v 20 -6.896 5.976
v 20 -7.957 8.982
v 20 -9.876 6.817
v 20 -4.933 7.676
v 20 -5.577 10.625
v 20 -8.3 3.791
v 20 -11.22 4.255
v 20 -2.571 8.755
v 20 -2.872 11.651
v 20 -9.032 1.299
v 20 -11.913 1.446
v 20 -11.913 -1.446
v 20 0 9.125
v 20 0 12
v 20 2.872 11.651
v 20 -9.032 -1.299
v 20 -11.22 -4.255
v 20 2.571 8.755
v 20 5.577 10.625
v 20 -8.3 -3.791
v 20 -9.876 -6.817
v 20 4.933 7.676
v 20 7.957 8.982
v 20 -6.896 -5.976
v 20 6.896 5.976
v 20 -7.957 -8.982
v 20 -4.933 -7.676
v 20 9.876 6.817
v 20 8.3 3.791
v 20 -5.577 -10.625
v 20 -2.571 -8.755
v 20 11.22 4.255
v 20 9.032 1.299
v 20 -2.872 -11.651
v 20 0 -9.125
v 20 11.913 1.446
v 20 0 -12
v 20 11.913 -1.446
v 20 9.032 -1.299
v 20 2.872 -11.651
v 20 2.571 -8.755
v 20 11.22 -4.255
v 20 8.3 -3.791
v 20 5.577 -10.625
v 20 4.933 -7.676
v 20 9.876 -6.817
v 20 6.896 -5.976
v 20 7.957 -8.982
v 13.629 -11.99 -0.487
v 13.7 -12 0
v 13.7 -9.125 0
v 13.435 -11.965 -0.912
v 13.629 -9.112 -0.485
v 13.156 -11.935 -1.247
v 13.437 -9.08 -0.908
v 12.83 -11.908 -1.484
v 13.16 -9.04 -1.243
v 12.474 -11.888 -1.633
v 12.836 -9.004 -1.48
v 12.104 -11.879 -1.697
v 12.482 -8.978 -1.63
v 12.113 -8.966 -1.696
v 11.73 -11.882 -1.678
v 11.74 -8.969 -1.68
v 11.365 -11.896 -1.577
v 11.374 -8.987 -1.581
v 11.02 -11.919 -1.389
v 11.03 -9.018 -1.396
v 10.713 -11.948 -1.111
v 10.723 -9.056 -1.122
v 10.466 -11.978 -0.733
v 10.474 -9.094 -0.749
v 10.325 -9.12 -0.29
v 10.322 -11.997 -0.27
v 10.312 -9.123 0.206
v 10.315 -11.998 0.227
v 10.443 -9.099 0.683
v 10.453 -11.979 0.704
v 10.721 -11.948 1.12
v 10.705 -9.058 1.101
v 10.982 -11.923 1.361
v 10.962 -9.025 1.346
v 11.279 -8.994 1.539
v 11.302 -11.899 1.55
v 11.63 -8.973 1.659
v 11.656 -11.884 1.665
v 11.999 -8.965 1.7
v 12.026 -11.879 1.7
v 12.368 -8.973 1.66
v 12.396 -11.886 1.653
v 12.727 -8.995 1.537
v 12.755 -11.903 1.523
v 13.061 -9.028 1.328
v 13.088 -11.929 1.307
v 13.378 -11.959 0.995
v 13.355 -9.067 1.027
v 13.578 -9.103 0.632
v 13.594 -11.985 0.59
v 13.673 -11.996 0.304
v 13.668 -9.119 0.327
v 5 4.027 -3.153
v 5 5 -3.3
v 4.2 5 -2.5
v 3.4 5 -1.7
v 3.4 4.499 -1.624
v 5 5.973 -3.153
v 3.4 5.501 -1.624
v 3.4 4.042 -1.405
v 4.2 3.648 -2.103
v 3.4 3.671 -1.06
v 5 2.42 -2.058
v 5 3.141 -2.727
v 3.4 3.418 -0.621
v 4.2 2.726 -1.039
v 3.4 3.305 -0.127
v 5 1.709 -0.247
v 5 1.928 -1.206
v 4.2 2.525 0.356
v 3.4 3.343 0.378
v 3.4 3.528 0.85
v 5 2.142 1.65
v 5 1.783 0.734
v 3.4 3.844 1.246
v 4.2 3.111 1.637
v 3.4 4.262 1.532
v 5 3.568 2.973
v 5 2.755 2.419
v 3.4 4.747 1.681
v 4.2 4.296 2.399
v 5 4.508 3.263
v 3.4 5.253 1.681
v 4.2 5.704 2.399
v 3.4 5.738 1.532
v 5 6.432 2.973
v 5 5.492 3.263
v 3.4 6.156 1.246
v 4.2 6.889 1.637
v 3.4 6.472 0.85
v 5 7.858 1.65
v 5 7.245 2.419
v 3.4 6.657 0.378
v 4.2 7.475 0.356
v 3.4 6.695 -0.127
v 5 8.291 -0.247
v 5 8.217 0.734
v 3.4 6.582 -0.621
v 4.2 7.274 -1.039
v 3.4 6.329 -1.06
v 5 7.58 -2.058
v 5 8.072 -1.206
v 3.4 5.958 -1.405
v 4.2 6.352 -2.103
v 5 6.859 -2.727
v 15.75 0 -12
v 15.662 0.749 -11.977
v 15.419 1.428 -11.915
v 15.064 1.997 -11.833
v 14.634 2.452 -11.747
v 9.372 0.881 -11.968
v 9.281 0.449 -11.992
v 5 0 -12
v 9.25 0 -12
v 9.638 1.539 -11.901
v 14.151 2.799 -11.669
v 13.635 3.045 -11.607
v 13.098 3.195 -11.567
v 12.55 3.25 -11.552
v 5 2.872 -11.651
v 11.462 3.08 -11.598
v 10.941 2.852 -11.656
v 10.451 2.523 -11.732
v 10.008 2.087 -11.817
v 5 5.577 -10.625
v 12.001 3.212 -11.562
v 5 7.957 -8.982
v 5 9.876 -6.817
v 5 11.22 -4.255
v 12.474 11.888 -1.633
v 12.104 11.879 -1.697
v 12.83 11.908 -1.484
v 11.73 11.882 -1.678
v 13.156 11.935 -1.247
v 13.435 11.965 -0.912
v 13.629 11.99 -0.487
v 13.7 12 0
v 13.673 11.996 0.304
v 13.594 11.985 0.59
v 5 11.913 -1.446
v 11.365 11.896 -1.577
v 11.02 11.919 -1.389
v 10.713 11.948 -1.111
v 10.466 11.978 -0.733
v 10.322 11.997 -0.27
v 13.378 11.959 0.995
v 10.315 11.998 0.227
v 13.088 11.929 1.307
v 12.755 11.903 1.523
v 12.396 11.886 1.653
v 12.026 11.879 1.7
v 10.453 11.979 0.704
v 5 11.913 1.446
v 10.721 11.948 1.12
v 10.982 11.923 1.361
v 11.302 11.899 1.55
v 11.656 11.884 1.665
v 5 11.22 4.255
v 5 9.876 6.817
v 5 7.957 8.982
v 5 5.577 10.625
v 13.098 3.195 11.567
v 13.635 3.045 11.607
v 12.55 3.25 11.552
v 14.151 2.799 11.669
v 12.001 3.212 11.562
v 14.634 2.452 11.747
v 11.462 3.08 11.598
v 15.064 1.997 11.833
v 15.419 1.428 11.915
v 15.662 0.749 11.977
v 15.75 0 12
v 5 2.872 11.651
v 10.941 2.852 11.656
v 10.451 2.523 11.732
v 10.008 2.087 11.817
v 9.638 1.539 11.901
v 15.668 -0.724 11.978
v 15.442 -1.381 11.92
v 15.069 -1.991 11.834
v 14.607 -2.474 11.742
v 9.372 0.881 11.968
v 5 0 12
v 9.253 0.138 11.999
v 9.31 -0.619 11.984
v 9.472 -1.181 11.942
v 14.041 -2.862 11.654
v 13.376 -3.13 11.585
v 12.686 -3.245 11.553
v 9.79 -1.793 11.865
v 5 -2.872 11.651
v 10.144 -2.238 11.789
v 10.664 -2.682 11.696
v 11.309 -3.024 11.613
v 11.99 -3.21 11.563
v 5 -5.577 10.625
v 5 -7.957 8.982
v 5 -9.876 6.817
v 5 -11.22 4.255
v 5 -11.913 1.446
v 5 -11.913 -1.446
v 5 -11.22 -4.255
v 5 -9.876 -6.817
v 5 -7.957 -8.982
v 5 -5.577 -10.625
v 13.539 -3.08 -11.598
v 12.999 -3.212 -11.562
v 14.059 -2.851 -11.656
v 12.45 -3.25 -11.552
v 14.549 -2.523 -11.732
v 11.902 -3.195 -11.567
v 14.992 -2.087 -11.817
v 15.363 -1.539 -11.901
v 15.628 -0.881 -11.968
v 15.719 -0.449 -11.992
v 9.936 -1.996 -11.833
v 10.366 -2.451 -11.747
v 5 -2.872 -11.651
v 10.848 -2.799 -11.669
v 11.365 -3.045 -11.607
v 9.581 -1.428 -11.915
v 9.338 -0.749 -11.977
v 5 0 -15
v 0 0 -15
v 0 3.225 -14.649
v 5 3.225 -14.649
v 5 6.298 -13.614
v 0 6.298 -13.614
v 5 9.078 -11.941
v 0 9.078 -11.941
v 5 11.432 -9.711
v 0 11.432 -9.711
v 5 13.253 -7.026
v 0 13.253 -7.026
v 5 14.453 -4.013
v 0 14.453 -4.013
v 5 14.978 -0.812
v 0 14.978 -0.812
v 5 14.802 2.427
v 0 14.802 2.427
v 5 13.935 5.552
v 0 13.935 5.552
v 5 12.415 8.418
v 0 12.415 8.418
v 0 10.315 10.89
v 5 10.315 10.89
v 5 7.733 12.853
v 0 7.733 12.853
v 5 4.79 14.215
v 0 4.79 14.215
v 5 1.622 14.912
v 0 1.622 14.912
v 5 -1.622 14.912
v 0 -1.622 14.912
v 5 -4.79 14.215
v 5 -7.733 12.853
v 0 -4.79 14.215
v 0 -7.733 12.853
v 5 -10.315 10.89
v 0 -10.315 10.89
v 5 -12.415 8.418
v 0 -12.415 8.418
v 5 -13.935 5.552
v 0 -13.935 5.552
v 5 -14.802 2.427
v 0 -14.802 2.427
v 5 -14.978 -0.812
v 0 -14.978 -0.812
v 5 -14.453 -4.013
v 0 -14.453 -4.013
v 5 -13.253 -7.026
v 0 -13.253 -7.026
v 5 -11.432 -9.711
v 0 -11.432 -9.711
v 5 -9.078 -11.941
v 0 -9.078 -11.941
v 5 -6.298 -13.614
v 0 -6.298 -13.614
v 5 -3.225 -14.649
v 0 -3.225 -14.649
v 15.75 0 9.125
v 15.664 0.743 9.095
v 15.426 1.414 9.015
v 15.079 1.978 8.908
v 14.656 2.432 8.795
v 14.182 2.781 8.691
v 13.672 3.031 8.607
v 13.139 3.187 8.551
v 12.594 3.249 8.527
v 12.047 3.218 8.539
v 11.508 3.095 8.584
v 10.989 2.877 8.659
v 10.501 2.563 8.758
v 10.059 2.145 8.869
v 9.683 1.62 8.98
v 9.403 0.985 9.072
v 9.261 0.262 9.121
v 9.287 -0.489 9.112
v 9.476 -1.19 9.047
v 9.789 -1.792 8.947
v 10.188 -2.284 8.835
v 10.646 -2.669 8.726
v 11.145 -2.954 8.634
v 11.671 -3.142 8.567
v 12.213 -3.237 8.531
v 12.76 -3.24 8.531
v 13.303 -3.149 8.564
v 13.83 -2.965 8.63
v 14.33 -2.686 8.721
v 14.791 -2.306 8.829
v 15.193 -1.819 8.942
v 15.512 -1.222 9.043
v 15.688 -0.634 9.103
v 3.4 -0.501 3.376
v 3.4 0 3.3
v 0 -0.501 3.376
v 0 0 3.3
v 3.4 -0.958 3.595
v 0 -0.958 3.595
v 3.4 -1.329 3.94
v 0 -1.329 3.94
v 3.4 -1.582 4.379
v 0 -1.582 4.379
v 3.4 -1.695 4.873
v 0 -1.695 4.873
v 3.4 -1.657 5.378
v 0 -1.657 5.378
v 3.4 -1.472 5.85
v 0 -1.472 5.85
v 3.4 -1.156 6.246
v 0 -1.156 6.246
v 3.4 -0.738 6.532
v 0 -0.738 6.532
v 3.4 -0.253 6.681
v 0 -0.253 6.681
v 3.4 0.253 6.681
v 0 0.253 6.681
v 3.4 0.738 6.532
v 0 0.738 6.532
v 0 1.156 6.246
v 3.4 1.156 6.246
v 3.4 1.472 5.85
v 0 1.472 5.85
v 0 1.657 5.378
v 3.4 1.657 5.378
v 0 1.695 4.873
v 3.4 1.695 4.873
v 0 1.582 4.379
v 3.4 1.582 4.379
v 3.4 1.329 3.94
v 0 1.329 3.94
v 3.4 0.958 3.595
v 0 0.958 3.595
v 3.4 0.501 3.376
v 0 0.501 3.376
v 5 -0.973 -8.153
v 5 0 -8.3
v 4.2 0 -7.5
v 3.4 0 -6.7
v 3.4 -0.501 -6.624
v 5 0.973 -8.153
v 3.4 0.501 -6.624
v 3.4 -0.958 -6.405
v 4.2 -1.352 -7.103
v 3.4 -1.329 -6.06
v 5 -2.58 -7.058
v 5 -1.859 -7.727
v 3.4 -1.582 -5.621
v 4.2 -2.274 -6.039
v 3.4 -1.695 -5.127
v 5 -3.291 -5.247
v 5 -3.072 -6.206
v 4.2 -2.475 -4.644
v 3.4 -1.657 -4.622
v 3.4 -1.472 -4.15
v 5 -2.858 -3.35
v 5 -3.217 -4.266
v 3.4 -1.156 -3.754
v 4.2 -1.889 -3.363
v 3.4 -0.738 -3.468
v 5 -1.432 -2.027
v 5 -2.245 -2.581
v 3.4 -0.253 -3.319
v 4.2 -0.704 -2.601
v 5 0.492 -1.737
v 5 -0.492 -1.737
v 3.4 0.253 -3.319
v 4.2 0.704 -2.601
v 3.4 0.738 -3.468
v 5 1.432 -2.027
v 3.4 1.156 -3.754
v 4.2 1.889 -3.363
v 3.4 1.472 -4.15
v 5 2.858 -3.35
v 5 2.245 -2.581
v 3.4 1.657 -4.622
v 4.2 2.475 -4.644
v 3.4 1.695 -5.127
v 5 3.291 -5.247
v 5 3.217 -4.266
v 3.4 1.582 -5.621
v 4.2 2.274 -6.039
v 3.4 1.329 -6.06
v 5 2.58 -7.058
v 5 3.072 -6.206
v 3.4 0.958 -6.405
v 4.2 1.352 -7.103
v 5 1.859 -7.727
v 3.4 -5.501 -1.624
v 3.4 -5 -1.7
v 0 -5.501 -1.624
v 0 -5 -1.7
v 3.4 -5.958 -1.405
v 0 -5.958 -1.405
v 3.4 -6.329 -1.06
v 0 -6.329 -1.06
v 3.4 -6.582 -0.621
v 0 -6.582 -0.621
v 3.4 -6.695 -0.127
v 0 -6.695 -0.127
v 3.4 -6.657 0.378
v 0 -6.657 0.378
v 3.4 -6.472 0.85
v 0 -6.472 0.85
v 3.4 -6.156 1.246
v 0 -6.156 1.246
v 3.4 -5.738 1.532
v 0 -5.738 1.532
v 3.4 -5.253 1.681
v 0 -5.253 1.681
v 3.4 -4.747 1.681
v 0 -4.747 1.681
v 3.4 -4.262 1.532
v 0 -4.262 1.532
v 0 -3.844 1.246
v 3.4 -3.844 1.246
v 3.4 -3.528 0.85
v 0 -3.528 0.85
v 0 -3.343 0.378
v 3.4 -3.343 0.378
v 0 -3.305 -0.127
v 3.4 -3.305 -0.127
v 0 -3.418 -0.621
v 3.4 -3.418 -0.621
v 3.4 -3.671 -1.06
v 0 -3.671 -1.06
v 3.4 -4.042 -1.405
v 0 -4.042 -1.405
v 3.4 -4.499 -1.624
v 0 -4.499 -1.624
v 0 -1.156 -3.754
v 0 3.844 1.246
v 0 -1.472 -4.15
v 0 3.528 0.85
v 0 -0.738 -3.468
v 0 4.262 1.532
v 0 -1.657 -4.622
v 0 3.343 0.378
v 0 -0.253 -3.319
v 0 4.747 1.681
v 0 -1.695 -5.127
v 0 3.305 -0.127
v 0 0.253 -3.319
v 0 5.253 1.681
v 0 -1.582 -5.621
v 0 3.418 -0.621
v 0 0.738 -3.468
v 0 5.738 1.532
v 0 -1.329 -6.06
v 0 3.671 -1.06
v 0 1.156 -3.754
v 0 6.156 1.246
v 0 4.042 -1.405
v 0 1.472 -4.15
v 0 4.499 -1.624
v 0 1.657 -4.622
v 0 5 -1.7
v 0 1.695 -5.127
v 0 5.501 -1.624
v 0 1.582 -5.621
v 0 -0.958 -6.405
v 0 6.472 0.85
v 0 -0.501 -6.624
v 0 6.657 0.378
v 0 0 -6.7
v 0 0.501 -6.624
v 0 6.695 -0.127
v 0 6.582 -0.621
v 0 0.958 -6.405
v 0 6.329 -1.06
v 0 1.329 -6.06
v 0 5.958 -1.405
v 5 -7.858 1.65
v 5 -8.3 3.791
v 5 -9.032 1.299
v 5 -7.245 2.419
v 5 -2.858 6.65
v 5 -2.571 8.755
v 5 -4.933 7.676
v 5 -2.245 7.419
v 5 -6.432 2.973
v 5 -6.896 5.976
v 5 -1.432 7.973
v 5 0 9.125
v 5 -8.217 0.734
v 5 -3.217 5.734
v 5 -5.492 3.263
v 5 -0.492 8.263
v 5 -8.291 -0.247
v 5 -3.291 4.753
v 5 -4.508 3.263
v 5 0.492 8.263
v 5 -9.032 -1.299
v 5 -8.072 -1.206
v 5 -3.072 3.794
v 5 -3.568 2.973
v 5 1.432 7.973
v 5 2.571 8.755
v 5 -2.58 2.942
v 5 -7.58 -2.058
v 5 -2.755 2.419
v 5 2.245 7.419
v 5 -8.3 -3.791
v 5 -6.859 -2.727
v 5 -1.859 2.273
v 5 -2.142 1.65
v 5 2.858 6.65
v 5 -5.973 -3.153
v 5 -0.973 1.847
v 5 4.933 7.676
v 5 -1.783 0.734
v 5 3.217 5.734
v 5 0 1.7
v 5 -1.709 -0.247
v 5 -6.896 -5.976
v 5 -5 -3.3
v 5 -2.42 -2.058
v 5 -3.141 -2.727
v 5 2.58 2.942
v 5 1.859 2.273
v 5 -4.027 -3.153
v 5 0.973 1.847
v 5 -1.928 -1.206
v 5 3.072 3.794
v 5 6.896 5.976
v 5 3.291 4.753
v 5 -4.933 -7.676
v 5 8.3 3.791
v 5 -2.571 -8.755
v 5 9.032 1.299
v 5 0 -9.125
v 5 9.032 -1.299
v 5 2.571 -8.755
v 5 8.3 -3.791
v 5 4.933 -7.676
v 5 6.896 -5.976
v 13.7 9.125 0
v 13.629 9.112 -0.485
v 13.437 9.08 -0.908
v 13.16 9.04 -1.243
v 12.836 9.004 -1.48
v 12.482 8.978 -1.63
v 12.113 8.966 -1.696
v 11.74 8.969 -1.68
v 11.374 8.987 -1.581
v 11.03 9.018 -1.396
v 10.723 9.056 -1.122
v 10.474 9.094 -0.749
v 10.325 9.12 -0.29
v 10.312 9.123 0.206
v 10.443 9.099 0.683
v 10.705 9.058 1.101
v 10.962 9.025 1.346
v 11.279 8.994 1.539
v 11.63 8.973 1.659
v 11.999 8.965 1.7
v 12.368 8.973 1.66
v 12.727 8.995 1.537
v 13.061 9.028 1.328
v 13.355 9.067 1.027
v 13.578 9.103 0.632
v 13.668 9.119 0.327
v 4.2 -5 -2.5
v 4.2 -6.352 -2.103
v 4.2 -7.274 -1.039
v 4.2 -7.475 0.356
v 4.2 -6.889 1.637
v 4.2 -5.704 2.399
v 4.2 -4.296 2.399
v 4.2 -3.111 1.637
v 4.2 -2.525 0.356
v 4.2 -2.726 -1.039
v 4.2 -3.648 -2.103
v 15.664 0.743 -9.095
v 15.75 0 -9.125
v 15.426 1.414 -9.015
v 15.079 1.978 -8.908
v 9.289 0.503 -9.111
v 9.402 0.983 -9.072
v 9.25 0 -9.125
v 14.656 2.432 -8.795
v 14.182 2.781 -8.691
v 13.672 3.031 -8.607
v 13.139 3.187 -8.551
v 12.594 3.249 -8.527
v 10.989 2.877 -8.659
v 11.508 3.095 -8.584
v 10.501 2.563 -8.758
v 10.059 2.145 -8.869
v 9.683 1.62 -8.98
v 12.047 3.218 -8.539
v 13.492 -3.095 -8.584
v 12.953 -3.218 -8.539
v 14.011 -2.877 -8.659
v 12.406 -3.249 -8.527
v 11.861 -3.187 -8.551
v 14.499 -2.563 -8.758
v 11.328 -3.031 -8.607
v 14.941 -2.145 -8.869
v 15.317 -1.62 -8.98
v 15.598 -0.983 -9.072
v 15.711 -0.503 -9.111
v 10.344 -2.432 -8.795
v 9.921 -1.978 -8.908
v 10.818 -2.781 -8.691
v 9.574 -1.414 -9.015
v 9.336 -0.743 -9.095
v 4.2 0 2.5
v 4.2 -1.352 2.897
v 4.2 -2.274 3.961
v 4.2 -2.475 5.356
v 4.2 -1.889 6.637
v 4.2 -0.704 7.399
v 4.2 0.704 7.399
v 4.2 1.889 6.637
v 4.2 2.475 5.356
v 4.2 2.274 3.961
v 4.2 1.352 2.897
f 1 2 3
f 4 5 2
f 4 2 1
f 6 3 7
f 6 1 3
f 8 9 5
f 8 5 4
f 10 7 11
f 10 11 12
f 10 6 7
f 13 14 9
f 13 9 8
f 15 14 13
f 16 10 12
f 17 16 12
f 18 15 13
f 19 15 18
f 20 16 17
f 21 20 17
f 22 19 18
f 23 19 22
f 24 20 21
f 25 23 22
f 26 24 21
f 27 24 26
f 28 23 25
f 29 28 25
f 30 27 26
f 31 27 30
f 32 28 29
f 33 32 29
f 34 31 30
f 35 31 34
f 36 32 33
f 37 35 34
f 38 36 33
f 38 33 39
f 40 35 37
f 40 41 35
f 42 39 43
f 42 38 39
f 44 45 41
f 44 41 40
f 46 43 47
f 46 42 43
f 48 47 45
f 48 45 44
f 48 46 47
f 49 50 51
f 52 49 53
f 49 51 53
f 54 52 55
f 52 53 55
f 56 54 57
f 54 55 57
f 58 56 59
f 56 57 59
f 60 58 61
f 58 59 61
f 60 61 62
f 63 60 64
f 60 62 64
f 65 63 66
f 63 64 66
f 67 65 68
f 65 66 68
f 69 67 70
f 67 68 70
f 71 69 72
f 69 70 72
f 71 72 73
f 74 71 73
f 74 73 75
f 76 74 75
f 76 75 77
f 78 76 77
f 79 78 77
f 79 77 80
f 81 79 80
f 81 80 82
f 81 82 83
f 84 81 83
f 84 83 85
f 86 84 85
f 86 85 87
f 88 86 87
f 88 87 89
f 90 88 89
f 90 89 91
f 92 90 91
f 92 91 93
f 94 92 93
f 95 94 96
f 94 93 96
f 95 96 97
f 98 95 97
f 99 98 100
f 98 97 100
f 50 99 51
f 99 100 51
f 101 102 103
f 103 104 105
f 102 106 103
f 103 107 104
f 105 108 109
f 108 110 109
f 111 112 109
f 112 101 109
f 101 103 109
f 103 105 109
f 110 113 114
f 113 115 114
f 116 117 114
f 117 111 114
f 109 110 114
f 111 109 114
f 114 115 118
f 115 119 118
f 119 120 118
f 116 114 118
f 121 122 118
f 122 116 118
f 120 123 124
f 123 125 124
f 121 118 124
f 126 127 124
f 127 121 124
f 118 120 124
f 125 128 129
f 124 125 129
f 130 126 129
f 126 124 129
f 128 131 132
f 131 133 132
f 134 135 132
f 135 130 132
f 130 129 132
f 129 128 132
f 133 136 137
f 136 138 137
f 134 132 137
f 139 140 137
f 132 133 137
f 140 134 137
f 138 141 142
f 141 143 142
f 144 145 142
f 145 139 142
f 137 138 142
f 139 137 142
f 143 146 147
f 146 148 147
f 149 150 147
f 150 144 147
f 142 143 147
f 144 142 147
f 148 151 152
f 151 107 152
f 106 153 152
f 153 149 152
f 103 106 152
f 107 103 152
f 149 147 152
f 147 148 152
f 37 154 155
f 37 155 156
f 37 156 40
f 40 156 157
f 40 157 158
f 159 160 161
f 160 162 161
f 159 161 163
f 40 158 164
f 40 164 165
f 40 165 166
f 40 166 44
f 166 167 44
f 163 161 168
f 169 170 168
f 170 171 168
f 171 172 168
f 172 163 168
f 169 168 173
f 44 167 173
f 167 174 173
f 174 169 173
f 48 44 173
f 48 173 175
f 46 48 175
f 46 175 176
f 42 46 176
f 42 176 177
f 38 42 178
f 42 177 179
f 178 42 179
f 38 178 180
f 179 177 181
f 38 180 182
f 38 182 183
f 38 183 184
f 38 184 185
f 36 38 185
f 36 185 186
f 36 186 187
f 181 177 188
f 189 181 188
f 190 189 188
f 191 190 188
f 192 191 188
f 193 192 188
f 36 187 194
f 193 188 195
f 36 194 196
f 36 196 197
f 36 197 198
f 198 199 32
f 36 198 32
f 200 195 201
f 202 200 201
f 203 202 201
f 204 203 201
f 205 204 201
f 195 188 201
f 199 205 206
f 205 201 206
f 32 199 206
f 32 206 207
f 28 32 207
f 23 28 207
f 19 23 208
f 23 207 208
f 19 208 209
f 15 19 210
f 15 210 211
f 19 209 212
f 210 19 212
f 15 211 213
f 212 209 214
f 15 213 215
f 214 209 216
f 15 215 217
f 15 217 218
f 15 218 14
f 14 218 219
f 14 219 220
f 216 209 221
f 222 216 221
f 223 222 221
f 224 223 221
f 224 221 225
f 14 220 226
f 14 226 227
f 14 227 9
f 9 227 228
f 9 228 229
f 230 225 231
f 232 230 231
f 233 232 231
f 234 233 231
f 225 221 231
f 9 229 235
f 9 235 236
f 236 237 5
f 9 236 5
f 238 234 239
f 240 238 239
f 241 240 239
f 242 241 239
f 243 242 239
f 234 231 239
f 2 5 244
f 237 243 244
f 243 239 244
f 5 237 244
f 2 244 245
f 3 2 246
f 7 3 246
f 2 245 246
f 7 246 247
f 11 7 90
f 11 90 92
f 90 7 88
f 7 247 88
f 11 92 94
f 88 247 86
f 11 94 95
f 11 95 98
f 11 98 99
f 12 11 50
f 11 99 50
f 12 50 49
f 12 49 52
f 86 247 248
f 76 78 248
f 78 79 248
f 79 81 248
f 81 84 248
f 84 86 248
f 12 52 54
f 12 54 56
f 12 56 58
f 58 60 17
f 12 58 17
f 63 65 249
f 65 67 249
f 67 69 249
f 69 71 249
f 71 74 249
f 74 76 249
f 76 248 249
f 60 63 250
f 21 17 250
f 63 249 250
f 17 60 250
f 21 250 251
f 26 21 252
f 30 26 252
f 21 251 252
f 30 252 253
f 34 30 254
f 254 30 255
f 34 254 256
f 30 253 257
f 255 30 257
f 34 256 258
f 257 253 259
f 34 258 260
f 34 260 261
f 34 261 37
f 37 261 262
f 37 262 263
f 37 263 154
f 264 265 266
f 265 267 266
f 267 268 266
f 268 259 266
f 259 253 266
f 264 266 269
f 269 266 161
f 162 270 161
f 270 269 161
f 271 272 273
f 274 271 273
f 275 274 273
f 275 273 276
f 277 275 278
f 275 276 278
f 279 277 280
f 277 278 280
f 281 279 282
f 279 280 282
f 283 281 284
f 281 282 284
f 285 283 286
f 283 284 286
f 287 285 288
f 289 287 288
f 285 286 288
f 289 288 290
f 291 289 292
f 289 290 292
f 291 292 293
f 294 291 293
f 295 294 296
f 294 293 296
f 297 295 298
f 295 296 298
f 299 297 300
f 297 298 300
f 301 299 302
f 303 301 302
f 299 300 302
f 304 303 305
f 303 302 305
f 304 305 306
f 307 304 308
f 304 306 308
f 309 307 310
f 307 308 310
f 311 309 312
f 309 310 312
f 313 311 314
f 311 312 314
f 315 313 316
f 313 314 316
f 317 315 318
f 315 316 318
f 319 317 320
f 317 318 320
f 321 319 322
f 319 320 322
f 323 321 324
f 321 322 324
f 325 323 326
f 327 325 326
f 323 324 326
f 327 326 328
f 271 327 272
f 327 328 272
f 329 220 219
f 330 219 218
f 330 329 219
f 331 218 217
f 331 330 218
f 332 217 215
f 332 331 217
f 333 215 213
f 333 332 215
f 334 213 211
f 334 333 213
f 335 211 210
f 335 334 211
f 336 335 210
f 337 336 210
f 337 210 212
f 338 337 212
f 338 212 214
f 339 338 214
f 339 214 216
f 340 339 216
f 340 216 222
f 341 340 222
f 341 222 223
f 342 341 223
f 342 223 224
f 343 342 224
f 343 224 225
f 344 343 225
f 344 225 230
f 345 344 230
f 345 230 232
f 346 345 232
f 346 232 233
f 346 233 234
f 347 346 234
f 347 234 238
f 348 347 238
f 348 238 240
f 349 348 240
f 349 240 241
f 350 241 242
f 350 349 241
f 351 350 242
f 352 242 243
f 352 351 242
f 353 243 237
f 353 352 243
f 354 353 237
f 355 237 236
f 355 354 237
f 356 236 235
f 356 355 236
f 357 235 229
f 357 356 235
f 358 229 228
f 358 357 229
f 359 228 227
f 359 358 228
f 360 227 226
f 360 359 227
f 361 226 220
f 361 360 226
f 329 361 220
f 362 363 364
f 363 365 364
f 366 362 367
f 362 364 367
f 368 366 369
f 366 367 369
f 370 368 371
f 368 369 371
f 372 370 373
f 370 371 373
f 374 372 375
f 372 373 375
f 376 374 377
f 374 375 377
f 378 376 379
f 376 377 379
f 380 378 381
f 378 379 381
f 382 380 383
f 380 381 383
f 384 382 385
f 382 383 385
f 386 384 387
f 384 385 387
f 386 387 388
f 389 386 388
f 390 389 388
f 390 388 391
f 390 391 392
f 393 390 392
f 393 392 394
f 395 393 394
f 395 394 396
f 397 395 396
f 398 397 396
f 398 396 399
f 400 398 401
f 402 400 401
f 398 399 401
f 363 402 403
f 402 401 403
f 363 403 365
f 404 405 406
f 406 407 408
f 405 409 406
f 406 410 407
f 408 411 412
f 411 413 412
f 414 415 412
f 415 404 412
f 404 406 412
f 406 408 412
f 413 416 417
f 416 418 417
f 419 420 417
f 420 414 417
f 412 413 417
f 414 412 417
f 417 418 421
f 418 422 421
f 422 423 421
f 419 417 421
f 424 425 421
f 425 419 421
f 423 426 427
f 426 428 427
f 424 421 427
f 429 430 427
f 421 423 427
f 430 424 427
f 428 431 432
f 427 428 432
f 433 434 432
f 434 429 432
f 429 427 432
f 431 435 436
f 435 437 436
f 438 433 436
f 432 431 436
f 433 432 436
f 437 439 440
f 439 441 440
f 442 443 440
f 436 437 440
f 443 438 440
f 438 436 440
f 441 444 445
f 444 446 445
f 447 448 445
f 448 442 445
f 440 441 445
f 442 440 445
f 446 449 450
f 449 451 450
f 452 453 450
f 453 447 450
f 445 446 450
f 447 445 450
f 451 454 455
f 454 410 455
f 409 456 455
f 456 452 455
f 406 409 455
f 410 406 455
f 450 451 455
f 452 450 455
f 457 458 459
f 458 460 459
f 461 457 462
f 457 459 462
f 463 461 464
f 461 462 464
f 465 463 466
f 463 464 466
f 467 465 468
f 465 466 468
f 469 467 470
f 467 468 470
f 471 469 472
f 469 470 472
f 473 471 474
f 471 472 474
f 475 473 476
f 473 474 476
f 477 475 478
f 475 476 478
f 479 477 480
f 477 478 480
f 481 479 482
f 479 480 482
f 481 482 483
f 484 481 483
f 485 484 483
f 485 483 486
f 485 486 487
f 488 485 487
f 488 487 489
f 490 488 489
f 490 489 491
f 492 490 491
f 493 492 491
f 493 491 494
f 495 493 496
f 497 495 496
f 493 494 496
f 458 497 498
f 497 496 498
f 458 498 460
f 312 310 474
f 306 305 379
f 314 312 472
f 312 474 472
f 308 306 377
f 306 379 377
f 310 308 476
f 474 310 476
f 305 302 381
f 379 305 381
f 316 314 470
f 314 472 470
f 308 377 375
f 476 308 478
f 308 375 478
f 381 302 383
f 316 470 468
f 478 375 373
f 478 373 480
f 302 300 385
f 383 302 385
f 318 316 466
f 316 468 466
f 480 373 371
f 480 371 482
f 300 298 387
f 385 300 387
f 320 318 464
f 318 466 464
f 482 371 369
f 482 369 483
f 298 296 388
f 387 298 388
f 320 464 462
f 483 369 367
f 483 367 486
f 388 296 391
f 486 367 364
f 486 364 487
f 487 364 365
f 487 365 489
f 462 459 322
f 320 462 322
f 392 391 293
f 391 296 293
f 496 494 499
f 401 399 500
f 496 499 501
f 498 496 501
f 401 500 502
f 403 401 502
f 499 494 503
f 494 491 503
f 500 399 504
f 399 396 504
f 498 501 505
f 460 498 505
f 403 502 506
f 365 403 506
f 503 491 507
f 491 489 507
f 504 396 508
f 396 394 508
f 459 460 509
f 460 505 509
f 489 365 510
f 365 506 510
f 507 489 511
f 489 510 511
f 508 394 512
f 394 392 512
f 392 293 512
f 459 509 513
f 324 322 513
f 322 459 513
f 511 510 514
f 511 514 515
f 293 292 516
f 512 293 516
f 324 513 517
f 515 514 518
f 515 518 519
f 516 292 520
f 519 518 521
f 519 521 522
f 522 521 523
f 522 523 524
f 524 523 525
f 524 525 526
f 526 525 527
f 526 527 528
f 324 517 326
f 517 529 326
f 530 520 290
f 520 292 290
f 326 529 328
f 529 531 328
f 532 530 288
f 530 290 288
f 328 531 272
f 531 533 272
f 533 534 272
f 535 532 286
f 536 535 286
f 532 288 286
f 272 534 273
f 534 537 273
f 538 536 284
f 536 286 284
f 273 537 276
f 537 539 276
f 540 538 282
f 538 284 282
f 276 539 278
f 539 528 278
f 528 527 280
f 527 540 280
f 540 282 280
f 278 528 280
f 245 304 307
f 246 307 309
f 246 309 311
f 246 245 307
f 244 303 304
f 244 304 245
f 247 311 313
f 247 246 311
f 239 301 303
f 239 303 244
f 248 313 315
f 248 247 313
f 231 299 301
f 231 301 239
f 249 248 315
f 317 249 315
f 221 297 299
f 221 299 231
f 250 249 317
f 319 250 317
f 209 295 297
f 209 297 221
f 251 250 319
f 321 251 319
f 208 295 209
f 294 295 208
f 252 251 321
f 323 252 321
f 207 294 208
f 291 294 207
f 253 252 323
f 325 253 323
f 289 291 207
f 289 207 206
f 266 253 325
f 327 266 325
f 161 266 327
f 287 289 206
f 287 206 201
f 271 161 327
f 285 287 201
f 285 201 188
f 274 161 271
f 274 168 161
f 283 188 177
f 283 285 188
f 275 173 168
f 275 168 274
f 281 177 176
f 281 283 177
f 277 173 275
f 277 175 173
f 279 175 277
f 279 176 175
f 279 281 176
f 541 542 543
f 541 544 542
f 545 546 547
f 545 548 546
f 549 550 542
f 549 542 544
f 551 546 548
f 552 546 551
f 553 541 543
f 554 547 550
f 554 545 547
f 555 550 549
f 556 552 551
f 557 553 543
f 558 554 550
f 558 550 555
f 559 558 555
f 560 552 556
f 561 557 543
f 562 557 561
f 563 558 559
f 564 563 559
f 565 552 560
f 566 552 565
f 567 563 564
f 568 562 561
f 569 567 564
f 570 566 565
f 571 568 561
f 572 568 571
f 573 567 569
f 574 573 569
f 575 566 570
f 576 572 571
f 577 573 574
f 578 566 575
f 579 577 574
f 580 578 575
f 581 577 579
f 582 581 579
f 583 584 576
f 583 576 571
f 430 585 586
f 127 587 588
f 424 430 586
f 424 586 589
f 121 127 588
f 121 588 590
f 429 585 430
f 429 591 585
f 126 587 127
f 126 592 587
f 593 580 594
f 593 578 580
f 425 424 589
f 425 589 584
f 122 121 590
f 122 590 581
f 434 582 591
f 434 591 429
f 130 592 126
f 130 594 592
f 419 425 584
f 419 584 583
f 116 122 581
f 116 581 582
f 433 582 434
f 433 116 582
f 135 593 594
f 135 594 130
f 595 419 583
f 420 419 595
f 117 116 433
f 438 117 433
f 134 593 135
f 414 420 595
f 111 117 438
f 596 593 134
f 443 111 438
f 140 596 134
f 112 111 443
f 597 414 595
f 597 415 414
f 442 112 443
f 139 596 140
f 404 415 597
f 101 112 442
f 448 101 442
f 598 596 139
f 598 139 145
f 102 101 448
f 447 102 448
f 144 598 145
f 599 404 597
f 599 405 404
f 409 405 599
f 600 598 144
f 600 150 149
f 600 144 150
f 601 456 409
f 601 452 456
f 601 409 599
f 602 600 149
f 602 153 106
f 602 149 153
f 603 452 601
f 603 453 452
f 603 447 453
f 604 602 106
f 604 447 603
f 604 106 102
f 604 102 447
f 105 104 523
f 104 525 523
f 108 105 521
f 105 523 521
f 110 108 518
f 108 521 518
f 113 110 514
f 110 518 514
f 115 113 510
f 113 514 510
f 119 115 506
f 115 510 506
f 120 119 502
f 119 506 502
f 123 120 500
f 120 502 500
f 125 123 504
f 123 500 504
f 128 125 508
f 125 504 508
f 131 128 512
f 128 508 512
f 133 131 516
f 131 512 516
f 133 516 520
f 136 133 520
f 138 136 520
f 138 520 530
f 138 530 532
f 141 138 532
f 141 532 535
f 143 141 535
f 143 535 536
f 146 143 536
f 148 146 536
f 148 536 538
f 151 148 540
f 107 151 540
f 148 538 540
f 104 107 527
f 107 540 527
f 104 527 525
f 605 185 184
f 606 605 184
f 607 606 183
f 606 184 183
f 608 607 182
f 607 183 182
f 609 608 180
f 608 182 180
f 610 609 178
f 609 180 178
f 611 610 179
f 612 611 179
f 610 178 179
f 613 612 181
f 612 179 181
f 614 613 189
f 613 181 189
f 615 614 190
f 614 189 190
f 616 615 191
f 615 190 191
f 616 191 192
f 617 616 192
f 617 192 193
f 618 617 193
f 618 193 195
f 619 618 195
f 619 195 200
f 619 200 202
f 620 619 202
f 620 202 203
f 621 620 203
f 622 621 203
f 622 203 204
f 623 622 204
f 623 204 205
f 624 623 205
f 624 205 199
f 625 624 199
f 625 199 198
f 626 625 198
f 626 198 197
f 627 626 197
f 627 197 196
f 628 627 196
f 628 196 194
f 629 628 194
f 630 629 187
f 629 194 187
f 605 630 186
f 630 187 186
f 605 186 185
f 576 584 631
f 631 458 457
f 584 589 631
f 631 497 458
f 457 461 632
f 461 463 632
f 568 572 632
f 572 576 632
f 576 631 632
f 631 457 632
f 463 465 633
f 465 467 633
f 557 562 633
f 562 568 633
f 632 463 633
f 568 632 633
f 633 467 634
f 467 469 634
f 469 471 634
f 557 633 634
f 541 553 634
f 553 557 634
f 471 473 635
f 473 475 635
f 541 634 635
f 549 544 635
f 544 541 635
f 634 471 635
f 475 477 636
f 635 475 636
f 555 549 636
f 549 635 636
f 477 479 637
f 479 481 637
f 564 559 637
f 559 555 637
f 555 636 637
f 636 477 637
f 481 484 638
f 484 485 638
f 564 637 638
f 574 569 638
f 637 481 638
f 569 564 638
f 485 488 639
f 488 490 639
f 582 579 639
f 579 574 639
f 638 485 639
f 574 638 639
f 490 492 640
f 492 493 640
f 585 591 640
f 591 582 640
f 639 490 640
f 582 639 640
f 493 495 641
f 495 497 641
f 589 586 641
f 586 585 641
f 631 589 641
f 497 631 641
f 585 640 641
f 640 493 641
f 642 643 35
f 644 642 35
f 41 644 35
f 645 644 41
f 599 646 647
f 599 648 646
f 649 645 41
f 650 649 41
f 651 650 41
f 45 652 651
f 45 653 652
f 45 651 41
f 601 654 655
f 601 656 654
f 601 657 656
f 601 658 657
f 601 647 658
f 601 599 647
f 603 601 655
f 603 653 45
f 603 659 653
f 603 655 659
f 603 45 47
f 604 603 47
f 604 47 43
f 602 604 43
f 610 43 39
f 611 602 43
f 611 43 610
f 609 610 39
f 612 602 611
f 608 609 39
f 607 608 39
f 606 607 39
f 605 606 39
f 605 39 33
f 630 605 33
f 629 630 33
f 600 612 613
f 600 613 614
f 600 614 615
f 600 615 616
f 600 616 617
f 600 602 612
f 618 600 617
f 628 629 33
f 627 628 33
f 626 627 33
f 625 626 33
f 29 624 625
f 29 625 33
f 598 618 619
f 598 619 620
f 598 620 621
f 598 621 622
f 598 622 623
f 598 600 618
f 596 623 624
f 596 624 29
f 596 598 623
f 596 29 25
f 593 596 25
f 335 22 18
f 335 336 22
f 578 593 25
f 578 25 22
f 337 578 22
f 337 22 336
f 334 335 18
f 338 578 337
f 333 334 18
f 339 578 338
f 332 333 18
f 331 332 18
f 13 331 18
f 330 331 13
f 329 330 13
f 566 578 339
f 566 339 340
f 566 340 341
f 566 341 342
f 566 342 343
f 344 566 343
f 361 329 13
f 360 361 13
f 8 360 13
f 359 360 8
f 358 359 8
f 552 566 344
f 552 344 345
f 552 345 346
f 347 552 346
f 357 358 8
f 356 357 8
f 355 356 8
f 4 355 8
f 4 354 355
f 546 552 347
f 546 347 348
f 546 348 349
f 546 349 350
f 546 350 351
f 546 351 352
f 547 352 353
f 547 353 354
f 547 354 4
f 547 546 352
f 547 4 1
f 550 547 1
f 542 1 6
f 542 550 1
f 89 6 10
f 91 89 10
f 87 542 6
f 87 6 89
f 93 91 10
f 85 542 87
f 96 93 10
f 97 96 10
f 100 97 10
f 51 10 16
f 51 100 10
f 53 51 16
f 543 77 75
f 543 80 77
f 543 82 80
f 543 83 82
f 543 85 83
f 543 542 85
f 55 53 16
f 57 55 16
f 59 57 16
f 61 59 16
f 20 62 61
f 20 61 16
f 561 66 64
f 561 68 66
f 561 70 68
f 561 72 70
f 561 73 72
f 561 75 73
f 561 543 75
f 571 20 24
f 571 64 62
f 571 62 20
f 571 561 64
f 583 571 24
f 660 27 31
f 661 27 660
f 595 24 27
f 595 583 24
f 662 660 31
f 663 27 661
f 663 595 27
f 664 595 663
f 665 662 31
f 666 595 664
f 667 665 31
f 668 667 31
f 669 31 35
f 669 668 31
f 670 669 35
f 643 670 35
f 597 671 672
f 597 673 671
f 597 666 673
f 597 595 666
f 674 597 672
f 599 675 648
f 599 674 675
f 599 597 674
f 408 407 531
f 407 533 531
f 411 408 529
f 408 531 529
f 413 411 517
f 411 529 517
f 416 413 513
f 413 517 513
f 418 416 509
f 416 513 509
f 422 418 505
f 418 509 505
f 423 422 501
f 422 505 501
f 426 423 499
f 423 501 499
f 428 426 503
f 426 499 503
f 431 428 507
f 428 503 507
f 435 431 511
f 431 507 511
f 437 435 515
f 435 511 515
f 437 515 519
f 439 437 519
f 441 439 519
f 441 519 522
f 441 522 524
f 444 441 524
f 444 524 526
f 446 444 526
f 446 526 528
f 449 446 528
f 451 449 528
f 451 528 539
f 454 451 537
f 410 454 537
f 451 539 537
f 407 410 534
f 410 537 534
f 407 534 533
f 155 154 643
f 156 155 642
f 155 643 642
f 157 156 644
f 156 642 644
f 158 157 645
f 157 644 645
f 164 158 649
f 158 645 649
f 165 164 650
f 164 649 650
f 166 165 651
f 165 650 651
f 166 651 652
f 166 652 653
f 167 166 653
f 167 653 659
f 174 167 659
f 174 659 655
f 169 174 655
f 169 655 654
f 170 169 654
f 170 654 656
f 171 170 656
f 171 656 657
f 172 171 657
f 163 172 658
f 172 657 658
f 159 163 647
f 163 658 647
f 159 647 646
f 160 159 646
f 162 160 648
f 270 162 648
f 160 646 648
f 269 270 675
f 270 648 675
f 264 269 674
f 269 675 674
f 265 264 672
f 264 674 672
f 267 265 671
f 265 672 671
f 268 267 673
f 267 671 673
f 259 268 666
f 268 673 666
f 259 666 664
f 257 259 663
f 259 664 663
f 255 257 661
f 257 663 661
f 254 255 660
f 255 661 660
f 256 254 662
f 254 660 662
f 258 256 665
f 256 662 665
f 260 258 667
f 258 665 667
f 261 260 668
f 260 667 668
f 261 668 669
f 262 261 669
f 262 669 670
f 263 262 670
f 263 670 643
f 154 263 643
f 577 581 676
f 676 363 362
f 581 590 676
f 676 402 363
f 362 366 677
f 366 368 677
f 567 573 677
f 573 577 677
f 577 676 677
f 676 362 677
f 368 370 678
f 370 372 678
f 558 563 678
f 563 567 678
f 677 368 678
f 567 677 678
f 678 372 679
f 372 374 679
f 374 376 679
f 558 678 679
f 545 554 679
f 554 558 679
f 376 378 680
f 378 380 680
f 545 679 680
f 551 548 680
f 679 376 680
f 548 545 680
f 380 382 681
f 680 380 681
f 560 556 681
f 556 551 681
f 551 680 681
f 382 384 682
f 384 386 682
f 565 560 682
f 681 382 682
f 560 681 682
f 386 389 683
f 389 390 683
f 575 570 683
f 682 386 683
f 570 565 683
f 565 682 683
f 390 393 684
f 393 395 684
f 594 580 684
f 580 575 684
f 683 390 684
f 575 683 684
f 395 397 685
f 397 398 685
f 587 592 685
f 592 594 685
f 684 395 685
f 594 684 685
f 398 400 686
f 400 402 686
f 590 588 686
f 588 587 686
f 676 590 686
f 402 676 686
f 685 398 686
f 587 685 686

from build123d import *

# Parameters (mm, degrees)
SKETCH_1_R                   = 15
EXTRUDE_1_DEPTH              = 5
SKETCH_1_5_R                 = 12
SKETCH_1_5_R_2               = 9.125
EXTRUDE_2_DEPTH              = 20
HOLE_WIZARD_M3_1_D           = 3.4
HOLE_WIZARD_M3_1_CSINK_D     = 6.6
HOLE_WIZARD_M3_1_CSINK_ANGLE = 90
SKETCH1_R                    = 3.25
CUT_EXTRUDE1_DEPTH           = 16
CUT_EXTRUDE1_DEPTH_BACK      = 16
M3_CLEARANCE_HOLE1_D         = 3.4
M3_CLEARANCE_HOLE1_DEPTH     = 35
M3_CLEARANCE_HOLE1_TIP       = 1.021463052


with BuildPart() as part:
    # 草图1 → 凸台-拉伸1 (new body)
    with BuildSketch(Plane(origin=(0, 0, 0), x_dir=(0, 0, -1), z_dir=(1, 0, 0))):
        Circle(SKETCH_1_R)
    extrude(amount=EXTRUDE_1_DEPTH)

    # 草图1<5> → 凸台-拉伸2 (add)
    with BuildSketch(Plane(origin=(0, 0, 0), x_dir=(0, 0, -1), z_dir=(1, 0, 0))):
        Circle(SKETCH_1_5_R)
        Circle(SKETCH_1_5_R_2, mode=Mode.SUBTRACT)
    extrude(amount=EXTRUDE_2_DEPTH)

    # M3 十字槽沉头木螺钉的锥形沉头孔1 (through all)
    with Locations(Plane(origin=(5, 0, 0), x_dir=(0, 0, 1), z_dir=(1, 0, 0))):
        with Locations((0, -5), (-5, 0), (0, 5), (5, 0)):
            CounterSinkHole(HOLE_WIZARD_M3_1_D / 2, HOLE_WIZARD_M3_1_CSINK_D / 2, counter_sink_angle=HOLE_WIZARD_M3_1_CSINK_ANGLE)

    # Sketch1 → Cut-Extrude1 (cut, two sides)
    with BuildSketch(Plane.XY) as cut_extrude1_sk:
        with Locations((12.5, 0)):
            Circle(SKETCH1_R)
    extrude(amount=CUT_EXTRUDE1_DEPTH, mode=Mode.SUBTRACT)
    extrude(cut_extrude1_sk.sketch, amount=-CUT_EXTRUDE1_DEPTH_BACK, mode=Mode.SUBTRACT)

    # M3 Clearance Hole1
    with Locations(Plane(origin=(0, -12, 0), x_dir=(-1, 0, 0), z_dir=(0, -1, 0))):
        with Locations((-12, 0)):
            Hole(M3_CLEARANCE_HOLE1_D / 2, depth=M3_CLEARANCE_HOLE1_DEPTH)
            with Locations((0, 0, -(M3_CLEARANCE_HOLE1_DEPTH + M3_CLEARANCE_HOLE1_TIP / 2))):  # 118° drill point
                Cone(0, M3_CLEARANCE_HOLE1_D / 2, M3_CLEARANCE_HOLE1_TIP, mode=Mode.SUBTRACT)


solid = part.part
